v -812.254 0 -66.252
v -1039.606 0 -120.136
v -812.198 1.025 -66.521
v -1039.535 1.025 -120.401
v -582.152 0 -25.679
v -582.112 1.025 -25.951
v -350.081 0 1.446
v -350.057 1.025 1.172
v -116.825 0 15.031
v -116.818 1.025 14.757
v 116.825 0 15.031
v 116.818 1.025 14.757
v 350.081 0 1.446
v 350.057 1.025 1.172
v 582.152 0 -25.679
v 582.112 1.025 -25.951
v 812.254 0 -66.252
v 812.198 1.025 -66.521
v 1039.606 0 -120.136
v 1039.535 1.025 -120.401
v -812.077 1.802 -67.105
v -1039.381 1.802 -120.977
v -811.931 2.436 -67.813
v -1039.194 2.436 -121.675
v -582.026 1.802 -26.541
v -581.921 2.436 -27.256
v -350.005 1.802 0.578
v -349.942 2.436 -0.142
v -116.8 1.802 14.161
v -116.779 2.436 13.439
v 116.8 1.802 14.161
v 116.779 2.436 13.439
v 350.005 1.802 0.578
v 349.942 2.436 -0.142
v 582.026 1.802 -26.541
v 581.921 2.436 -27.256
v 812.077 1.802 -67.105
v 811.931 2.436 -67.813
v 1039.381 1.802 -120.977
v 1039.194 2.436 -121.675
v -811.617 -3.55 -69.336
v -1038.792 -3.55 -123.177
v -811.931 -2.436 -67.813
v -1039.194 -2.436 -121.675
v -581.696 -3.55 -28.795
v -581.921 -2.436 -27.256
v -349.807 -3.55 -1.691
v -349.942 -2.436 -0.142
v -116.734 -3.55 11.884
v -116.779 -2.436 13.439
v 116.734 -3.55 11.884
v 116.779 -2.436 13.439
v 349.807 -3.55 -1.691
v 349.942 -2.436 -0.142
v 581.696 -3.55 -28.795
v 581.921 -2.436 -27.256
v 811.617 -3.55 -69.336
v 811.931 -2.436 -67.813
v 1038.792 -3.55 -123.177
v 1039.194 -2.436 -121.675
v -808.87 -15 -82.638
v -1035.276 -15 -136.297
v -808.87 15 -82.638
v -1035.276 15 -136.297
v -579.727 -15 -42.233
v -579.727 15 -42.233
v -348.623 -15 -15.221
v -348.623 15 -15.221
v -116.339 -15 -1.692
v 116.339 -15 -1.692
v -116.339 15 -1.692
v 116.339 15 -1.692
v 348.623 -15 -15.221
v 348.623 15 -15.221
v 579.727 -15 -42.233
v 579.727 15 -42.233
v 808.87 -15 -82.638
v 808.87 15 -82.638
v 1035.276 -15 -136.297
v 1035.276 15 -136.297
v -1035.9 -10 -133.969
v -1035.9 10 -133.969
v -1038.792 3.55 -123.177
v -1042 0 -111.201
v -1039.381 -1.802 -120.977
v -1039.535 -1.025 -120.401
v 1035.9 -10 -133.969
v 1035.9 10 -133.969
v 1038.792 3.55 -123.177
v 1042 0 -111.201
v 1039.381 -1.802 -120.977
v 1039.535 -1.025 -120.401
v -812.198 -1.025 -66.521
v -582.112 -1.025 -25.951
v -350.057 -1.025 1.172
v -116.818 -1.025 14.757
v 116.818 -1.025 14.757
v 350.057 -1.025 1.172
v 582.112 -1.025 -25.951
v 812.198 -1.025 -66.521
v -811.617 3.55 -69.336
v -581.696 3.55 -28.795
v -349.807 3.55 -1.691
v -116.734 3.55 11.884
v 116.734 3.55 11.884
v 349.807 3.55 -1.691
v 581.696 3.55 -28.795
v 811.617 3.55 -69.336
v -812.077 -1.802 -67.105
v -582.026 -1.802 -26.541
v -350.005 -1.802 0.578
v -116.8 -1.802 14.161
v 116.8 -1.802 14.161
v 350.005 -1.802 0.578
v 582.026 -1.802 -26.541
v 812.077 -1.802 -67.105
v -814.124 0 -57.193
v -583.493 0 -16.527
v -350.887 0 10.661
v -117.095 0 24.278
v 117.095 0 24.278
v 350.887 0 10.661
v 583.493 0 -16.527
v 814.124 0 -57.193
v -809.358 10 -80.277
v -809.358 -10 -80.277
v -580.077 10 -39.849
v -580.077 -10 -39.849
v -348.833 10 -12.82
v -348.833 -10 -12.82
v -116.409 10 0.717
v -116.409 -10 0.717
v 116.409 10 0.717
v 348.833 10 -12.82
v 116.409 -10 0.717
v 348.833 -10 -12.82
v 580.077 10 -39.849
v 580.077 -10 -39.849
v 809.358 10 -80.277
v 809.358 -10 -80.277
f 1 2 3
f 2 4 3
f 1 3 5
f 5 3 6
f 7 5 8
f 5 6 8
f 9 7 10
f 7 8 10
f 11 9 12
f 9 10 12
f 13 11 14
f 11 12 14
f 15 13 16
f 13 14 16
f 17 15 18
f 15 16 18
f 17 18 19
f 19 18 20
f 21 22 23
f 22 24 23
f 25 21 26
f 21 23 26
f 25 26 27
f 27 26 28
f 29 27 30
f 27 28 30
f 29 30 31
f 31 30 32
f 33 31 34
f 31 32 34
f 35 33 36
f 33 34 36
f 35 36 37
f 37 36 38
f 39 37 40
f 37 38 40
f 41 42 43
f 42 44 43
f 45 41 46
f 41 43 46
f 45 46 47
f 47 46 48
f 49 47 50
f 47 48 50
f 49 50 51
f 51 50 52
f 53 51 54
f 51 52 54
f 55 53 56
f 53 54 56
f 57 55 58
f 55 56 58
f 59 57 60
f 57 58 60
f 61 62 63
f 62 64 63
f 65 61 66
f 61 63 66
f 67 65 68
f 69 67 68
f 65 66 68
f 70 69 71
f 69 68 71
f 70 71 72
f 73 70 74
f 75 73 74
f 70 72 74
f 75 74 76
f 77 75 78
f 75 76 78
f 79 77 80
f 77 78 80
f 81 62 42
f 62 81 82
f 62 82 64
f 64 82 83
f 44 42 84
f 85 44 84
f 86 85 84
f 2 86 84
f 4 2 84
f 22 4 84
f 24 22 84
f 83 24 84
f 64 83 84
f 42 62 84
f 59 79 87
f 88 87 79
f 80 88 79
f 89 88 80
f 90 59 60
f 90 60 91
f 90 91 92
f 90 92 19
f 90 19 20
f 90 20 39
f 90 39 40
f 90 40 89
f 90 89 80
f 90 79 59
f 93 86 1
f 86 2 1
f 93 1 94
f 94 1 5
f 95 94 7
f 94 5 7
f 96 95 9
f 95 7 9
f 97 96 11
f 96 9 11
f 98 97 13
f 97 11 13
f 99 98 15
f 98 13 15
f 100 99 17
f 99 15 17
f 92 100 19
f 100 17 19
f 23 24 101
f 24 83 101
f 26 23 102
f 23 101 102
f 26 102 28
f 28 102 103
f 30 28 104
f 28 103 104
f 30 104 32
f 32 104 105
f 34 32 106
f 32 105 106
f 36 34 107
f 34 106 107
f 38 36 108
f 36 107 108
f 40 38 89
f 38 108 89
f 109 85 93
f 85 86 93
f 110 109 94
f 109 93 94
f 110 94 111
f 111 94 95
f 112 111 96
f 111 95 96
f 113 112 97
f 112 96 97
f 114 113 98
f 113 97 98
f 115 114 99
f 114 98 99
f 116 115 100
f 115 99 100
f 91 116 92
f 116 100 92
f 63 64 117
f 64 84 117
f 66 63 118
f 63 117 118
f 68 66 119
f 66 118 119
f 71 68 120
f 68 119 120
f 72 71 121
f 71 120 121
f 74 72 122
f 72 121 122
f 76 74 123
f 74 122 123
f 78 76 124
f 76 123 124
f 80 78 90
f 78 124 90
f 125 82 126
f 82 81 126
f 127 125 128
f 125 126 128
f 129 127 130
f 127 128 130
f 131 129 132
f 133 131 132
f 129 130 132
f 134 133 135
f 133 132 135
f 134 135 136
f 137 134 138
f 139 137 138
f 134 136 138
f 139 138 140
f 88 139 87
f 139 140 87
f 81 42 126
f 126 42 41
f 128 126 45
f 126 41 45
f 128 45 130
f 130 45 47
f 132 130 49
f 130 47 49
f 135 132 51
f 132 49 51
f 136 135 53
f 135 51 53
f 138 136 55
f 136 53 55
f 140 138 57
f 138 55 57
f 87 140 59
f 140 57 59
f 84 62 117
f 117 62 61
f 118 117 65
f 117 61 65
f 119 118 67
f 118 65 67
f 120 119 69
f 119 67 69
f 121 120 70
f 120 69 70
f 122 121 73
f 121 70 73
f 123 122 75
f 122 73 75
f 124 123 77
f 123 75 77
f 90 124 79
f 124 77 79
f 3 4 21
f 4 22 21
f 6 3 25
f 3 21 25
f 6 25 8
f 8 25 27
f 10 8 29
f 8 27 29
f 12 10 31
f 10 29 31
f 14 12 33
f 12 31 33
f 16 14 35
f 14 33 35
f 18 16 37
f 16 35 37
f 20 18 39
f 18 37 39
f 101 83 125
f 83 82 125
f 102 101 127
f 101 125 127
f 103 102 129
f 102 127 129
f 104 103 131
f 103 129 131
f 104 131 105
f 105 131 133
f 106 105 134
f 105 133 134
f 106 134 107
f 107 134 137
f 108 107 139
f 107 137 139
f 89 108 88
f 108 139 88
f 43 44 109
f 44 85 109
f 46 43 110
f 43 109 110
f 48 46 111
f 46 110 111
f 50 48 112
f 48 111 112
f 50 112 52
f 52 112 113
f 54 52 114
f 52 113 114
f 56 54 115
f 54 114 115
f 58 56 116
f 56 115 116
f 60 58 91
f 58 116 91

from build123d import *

# Parameters (mm, degrees)
F1_ANGLE_BACK = 15
F1_ANGLE      = 30


with BuildPart() as f1:
    # F0 (on Right) → F1 (revolve)
    with BuildSketch(Plane.YZ, mode=Mode.PRIVATE) as f1_sk:
        Polygon((0, 25.9807621135), (-15, 0), (15, 0), align=None)
        Polygon((0, 2.4102540378), (-10, 2.4102540378), (-3.5498759498, 13.5821966078), (-3.0693293034, 14.4145278149), (-2.5793681916, 15.2631653543), (-2.0490381057, 16.1817240079), (0, 19.7307621135), (2.0490381057, 16.1817240079), (2.5793681916, 15.2631653543), (3.0693293034, 14.4145278149), (3.5498759498, 13.5821966078), (10, 2.4102540378), align=None, mode=Mode.SUBTRACT)
        Polygon((0, 19.7307621135), (0, 16.7307621135), (1.0245190528, 16.4562430607), (2.0490381057, 16.1817240079), align=None)
        Polygon((-1.0245190528, 16.4562430607), (0, 16.7307621135), (0, 19.7307621135), (-2.0490381057, 16.1817240079), align=None)
        Polygon((2.0490381057, 16.1817240079), (1.0245190528, 16.4562430607), (1.8019436222, 15.8597042075), (2.5793681916, 15.2631653543), align=None)
        Polygon((2.4356364628, 15.1371160112), (3.0693293034, 14.4145278149), (2.5793681916, 15.2631653543), (1.8019436222, 15.8597042075), align=None)
        Polygon((2.4356364628, 15.1371160112), (3.5498759498, 13.5821966078), (3.0693293034, 14.4145278149), align=None)
        Polygon((-2.5793681916, 15.2631653543), (-3.0693293034, 14.4145278149), (-2.4356364628, 15.1371160112), (-1.8019436222, 15.8597042075), align=None)
        Polygon((-3.0693293034, 14.4145278149), (-3.5498759498, 13.5821966078), (-2.4356364628, 15.1371160112), align=None)
        Polygon((-1.8019436222, 15.8597042075), (-1.0245190528, 16.4562430607), (-2.0490381057, 16.1817240079), (-2.5793681916, 15.2631653543), align=None)
    revolve(f1_sk.sketch.rotate(Axis((0, -0.8083833382, -4000), (0, 1, 0)), -F1_ANGLE_BACK), axis=Axis((0, -0.8083833382, -4000), (0, 1, 0)), revolution_arc=F1_ANGLE)


solid = f1.part
